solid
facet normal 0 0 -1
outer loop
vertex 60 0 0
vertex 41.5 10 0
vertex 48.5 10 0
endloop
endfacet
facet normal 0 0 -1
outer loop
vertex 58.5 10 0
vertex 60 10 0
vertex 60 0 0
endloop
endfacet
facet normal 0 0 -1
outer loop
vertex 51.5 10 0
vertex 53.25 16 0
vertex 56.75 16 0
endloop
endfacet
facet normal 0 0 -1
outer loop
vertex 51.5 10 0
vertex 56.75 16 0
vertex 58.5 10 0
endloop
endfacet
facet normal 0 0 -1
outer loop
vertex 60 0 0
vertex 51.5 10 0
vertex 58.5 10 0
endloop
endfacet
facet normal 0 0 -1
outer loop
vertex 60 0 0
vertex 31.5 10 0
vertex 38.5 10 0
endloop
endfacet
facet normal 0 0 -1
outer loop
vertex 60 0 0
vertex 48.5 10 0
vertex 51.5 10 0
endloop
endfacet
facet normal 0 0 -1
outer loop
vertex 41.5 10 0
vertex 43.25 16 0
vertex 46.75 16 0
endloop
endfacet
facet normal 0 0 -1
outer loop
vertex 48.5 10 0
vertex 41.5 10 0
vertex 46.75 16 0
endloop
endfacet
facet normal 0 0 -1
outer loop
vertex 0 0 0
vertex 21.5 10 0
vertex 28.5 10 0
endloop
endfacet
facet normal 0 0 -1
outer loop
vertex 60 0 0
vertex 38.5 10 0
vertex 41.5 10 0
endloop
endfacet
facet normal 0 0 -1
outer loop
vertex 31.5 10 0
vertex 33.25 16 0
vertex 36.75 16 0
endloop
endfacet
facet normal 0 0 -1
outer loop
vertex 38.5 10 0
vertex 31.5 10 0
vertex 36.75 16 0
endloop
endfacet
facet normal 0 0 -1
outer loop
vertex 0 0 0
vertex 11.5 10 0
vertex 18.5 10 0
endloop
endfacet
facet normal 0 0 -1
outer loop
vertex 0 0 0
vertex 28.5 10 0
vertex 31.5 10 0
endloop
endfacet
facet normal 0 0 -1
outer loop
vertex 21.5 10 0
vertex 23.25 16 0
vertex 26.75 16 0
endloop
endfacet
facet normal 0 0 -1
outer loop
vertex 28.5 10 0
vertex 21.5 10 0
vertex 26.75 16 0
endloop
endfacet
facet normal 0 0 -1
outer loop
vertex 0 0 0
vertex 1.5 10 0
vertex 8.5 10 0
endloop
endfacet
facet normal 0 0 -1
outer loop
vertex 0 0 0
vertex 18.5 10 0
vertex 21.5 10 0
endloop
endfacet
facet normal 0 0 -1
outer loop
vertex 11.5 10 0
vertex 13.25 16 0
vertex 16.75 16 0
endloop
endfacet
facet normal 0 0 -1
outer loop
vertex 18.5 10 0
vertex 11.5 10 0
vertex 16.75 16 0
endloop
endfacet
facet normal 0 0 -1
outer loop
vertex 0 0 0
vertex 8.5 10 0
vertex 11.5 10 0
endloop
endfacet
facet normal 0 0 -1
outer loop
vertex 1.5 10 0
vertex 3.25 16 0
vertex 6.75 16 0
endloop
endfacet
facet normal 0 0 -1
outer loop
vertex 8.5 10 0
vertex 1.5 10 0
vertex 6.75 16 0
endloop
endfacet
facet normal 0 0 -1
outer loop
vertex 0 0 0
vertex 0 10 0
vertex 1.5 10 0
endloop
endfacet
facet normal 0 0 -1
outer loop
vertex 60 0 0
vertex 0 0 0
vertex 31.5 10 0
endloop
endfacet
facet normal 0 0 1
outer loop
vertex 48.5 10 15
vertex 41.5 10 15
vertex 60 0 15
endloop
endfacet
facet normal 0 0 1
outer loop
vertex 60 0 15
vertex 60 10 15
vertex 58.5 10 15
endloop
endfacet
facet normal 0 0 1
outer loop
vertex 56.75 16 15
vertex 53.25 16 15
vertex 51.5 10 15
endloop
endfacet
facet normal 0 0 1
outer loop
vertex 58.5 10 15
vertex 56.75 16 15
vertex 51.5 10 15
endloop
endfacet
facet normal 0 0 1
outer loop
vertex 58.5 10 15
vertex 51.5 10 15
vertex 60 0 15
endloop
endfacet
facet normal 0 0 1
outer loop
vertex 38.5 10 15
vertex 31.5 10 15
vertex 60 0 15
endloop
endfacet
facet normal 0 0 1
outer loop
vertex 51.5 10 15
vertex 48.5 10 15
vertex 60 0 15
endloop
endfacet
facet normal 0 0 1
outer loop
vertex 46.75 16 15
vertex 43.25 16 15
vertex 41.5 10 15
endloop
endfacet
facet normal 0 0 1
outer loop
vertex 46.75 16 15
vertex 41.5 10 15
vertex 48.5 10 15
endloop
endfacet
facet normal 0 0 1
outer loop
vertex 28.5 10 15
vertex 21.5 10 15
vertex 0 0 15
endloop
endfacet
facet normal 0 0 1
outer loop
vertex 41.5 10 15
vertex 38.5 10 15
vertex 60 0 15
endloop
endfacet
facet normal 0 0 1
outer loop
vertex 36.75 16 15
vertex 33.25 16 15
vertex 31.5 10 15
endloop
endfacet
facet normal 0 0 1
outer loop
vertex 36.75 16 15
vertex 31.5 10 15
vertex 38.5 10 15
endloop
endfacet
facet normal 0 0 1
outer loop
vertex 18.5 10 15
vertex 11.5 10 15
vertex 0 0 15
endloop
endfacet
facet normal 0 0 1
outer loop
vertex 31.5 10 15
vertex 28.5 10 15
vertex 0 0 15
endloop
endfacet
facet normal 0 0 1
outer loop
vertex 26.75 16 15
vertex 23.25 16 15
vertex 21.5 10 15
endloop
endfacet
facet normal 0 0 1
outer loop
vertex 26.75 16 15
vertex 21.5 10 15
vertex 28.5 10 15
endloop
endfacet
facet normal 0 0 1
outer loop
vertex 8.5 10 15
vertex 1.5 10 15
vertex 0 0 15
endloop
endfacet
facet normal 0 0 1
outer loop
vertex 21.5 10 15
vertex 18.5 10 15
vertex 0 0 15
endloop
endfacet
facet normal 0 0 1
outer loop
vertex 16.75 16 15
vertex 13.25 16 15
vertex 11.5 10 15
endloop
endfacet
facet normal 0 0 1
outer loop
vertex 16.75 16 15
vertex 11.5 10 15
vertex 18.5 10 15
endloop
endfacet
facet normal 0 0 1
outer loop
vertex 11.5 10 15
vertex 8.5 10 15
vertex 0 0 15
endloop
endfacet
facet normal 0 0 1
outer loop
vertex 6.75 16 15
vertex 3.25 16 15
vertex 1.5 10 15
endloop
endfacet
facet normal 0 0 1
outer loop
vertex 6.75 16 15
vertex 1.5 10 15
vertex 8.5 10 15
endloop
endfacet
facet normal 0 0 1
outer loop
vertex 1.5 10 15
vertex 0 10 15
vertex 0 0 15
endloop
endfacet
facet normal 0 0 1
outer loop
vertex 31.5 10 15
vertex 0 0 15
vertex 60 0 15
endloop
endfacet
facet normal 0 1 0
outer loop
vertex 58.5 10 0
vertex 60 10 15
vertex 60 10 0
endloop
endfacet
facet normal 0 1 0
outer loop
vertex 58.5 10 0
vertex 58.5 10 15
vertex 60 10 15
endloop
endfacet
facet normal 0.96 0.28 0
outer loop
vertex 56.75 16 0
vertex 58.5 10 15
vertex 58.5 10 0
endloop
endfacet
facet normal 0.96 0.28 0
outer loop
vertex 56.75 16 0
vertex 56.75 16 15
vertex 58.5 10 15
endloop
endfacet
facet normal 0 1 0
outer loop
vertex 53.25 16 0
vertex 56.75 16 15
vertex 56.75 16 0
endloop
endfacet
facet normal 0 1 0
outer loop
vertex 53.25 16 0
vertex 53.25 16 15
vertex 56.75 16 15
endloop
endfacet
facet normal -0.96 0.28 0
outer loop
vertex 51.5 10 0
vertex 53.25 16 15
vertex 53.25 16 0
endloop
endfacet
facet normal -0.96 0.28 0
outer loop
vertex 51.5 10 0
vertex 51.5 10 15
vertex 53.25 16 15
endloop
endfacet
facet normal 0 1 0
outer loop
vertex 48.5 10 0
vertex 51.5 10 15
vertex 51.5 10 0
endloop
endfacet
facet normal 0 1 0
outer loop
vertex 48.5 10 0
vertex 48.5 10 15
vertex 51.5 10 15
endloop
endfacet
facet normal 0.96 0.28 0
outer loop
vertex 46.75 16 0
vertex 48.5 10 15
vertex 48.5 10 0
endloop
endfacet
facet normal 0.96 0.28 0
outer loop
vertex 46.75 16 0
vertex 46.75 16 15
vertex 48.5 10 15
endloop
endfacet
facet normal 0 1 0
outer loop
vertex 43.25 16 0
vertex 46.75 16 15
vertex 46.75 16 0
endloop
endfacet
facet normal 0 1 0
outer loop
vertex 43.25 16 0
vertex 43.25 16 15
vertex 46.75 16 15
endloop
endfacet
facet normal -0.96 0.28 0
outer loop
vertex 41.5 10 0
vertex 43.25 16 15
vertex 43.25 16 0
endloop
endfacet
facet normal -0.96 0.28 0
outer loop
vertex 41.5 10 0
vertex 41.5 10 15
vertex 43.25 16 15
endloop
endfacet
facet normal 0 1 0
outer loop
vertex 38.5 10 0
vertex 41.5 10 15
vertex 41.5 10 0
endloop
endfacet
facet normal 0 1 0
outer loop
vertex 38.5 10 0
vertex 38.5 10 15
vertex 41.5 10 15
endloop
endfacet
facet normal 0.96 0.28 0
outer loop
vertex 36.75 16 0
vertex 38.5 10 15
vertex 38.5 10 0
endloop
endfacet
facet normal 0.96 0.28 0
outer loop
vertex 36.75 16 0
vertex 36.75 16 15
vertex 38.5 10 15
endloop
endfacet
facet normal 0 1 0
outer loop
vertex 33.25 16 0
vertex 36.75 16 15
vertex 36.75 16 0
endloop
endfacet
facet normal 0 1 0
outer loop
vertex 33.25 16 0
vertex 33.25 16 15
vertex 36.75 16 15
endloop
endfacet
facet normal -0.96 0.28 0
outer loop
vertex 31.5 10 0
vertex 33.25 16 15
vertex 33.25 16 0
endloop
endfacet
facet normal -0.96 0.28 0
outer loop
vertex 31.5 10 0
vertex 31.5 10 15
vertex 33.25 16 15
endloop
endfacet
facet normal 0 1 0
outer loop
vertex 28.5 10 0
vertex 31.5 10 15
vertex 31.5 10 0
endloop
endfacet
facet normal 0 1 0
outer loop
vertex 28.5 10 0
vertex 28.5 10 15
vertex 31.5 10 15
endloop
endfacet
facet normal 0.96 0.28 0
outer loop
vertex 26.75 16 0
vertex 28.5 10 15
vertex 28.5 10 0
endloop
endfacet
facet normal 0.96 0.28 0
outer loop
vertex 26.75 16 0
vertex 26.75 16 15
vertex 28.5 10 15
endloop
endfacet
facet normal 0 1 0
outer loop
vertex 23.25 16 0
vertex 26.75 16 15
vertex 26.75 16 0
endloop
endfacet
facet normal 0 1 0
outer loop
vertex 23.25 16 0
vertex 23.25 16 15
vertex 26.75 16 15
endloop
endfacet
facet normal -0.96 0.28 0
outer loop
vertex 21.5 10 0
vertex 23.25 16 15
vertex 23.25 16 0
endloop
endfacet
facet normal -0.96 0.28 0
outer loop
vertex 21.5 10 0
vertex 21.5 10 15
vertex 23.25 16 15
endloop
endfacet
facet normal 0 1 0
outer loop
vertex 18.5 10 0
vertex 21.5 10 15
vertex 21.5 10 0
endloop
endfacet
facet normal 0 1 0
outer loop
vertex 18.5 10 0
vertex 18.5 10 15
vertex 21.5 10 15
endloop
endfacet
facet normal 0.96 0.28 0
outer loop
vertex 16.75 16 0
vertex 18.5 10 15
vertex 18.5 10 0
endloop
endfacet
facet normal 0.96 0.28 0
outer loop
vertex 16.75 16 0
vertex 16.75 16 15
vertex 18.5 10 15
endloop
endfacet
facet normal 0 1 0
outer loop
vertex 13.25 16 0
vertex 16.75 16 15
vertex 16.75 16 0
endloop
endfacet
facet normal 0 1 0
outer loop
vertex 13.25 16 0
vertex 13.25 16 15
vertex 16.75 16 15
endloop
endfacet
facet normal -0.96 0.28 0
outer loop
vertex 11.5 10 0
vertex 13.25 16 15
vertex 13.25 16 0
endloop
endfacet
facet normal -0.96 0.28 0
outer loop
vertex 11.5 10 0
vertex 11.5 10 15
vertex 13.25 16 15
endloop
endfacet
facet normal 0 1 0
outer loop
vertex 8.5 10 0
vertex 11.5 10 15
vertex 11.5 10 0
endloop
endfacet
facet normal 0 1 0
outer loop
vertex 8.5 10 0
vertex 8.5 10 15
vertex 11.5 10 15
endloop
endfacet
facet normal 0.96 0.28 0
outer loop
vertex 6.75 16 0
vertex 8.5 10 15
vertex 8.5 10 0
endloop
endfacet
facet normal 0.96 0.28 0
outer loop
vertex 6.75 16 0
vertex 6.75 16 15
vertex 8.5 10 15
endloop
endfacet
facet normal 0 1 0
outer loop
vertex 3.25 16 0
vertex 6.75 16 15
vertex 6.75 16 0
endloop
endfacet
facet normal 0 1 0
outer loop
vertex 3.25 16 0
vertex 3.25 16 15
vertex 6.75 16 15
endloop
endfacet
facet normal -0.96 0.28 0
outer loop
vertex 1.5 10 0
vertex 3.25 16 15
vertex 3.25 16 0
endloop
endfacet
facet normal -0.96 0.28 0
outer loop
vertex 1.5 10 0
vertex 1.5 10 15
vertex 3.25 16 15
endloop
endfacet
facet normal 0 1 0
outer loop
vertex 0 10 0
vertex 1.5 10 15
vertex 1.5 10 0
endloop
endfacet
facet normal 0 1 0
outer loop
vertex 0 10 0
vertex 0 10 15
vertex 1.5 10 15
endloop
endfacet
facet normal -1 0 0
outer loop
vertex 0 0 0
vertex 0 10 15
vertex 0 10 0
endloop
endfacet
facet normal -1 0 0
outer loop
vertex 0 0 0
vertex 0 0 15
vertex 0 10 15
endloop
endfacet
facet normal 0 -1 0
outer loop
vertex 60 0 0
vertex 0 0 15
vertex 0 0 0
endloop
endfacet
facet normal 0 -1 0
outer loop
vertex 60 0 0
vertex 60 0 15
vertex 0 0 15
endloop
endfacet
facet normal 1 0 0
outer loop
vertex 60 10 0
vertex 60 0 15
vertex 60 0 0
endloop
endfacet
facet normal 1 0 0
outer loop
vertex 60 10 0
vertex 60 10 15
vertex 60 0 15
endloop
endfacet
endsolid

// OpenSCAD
$fn = 32;

// ----------------------------------------------------------------------
// Gear rack: 6 teeth, pitch 10 mm
// ----------------------------------------------------------------------

// --- parameters (mm) ---
teeth = 6;                // number of teeth
pitch = 10;               // tooth pitch, X
root_w = 7;               // tooth width at the root
tip_w = 3.5;              // tooth width at the tip
base_h = 10;              // rack body height, Y
tooth_h = 6;              // tooth height above the body
plate_t = 15;             // rack width, Z (extrusion height)

rack_l = teeth * pitch;  // overall length
total_h = base_h + tooth_h;  // overall height

profile = [[0, 0], [60, 0], [60, 10], [58.5, 10], [56.75, 16], [53.25, 16], [51.5, 10], [48.5, 10], [46.75, 16], [43.25, 16], [41.5, 10], [38.5, 10], [36.75, 16], [33.25, 16], [31.5, 10], [28.5, 10], [26.75, 16], [23.25, 16], [21.5, 10], [18.5, 10], [16.75, 16], [13.25, 16], [11.5, 10], [8.5, 10], [6.75, 16], [3.25, 16], [1.5, 10], [0, 10]];  // primary outline, 28 points, counter clockwise

// --- the one profile operation ---
linear_extrude(height = plate_t) polygon(points = profile);
